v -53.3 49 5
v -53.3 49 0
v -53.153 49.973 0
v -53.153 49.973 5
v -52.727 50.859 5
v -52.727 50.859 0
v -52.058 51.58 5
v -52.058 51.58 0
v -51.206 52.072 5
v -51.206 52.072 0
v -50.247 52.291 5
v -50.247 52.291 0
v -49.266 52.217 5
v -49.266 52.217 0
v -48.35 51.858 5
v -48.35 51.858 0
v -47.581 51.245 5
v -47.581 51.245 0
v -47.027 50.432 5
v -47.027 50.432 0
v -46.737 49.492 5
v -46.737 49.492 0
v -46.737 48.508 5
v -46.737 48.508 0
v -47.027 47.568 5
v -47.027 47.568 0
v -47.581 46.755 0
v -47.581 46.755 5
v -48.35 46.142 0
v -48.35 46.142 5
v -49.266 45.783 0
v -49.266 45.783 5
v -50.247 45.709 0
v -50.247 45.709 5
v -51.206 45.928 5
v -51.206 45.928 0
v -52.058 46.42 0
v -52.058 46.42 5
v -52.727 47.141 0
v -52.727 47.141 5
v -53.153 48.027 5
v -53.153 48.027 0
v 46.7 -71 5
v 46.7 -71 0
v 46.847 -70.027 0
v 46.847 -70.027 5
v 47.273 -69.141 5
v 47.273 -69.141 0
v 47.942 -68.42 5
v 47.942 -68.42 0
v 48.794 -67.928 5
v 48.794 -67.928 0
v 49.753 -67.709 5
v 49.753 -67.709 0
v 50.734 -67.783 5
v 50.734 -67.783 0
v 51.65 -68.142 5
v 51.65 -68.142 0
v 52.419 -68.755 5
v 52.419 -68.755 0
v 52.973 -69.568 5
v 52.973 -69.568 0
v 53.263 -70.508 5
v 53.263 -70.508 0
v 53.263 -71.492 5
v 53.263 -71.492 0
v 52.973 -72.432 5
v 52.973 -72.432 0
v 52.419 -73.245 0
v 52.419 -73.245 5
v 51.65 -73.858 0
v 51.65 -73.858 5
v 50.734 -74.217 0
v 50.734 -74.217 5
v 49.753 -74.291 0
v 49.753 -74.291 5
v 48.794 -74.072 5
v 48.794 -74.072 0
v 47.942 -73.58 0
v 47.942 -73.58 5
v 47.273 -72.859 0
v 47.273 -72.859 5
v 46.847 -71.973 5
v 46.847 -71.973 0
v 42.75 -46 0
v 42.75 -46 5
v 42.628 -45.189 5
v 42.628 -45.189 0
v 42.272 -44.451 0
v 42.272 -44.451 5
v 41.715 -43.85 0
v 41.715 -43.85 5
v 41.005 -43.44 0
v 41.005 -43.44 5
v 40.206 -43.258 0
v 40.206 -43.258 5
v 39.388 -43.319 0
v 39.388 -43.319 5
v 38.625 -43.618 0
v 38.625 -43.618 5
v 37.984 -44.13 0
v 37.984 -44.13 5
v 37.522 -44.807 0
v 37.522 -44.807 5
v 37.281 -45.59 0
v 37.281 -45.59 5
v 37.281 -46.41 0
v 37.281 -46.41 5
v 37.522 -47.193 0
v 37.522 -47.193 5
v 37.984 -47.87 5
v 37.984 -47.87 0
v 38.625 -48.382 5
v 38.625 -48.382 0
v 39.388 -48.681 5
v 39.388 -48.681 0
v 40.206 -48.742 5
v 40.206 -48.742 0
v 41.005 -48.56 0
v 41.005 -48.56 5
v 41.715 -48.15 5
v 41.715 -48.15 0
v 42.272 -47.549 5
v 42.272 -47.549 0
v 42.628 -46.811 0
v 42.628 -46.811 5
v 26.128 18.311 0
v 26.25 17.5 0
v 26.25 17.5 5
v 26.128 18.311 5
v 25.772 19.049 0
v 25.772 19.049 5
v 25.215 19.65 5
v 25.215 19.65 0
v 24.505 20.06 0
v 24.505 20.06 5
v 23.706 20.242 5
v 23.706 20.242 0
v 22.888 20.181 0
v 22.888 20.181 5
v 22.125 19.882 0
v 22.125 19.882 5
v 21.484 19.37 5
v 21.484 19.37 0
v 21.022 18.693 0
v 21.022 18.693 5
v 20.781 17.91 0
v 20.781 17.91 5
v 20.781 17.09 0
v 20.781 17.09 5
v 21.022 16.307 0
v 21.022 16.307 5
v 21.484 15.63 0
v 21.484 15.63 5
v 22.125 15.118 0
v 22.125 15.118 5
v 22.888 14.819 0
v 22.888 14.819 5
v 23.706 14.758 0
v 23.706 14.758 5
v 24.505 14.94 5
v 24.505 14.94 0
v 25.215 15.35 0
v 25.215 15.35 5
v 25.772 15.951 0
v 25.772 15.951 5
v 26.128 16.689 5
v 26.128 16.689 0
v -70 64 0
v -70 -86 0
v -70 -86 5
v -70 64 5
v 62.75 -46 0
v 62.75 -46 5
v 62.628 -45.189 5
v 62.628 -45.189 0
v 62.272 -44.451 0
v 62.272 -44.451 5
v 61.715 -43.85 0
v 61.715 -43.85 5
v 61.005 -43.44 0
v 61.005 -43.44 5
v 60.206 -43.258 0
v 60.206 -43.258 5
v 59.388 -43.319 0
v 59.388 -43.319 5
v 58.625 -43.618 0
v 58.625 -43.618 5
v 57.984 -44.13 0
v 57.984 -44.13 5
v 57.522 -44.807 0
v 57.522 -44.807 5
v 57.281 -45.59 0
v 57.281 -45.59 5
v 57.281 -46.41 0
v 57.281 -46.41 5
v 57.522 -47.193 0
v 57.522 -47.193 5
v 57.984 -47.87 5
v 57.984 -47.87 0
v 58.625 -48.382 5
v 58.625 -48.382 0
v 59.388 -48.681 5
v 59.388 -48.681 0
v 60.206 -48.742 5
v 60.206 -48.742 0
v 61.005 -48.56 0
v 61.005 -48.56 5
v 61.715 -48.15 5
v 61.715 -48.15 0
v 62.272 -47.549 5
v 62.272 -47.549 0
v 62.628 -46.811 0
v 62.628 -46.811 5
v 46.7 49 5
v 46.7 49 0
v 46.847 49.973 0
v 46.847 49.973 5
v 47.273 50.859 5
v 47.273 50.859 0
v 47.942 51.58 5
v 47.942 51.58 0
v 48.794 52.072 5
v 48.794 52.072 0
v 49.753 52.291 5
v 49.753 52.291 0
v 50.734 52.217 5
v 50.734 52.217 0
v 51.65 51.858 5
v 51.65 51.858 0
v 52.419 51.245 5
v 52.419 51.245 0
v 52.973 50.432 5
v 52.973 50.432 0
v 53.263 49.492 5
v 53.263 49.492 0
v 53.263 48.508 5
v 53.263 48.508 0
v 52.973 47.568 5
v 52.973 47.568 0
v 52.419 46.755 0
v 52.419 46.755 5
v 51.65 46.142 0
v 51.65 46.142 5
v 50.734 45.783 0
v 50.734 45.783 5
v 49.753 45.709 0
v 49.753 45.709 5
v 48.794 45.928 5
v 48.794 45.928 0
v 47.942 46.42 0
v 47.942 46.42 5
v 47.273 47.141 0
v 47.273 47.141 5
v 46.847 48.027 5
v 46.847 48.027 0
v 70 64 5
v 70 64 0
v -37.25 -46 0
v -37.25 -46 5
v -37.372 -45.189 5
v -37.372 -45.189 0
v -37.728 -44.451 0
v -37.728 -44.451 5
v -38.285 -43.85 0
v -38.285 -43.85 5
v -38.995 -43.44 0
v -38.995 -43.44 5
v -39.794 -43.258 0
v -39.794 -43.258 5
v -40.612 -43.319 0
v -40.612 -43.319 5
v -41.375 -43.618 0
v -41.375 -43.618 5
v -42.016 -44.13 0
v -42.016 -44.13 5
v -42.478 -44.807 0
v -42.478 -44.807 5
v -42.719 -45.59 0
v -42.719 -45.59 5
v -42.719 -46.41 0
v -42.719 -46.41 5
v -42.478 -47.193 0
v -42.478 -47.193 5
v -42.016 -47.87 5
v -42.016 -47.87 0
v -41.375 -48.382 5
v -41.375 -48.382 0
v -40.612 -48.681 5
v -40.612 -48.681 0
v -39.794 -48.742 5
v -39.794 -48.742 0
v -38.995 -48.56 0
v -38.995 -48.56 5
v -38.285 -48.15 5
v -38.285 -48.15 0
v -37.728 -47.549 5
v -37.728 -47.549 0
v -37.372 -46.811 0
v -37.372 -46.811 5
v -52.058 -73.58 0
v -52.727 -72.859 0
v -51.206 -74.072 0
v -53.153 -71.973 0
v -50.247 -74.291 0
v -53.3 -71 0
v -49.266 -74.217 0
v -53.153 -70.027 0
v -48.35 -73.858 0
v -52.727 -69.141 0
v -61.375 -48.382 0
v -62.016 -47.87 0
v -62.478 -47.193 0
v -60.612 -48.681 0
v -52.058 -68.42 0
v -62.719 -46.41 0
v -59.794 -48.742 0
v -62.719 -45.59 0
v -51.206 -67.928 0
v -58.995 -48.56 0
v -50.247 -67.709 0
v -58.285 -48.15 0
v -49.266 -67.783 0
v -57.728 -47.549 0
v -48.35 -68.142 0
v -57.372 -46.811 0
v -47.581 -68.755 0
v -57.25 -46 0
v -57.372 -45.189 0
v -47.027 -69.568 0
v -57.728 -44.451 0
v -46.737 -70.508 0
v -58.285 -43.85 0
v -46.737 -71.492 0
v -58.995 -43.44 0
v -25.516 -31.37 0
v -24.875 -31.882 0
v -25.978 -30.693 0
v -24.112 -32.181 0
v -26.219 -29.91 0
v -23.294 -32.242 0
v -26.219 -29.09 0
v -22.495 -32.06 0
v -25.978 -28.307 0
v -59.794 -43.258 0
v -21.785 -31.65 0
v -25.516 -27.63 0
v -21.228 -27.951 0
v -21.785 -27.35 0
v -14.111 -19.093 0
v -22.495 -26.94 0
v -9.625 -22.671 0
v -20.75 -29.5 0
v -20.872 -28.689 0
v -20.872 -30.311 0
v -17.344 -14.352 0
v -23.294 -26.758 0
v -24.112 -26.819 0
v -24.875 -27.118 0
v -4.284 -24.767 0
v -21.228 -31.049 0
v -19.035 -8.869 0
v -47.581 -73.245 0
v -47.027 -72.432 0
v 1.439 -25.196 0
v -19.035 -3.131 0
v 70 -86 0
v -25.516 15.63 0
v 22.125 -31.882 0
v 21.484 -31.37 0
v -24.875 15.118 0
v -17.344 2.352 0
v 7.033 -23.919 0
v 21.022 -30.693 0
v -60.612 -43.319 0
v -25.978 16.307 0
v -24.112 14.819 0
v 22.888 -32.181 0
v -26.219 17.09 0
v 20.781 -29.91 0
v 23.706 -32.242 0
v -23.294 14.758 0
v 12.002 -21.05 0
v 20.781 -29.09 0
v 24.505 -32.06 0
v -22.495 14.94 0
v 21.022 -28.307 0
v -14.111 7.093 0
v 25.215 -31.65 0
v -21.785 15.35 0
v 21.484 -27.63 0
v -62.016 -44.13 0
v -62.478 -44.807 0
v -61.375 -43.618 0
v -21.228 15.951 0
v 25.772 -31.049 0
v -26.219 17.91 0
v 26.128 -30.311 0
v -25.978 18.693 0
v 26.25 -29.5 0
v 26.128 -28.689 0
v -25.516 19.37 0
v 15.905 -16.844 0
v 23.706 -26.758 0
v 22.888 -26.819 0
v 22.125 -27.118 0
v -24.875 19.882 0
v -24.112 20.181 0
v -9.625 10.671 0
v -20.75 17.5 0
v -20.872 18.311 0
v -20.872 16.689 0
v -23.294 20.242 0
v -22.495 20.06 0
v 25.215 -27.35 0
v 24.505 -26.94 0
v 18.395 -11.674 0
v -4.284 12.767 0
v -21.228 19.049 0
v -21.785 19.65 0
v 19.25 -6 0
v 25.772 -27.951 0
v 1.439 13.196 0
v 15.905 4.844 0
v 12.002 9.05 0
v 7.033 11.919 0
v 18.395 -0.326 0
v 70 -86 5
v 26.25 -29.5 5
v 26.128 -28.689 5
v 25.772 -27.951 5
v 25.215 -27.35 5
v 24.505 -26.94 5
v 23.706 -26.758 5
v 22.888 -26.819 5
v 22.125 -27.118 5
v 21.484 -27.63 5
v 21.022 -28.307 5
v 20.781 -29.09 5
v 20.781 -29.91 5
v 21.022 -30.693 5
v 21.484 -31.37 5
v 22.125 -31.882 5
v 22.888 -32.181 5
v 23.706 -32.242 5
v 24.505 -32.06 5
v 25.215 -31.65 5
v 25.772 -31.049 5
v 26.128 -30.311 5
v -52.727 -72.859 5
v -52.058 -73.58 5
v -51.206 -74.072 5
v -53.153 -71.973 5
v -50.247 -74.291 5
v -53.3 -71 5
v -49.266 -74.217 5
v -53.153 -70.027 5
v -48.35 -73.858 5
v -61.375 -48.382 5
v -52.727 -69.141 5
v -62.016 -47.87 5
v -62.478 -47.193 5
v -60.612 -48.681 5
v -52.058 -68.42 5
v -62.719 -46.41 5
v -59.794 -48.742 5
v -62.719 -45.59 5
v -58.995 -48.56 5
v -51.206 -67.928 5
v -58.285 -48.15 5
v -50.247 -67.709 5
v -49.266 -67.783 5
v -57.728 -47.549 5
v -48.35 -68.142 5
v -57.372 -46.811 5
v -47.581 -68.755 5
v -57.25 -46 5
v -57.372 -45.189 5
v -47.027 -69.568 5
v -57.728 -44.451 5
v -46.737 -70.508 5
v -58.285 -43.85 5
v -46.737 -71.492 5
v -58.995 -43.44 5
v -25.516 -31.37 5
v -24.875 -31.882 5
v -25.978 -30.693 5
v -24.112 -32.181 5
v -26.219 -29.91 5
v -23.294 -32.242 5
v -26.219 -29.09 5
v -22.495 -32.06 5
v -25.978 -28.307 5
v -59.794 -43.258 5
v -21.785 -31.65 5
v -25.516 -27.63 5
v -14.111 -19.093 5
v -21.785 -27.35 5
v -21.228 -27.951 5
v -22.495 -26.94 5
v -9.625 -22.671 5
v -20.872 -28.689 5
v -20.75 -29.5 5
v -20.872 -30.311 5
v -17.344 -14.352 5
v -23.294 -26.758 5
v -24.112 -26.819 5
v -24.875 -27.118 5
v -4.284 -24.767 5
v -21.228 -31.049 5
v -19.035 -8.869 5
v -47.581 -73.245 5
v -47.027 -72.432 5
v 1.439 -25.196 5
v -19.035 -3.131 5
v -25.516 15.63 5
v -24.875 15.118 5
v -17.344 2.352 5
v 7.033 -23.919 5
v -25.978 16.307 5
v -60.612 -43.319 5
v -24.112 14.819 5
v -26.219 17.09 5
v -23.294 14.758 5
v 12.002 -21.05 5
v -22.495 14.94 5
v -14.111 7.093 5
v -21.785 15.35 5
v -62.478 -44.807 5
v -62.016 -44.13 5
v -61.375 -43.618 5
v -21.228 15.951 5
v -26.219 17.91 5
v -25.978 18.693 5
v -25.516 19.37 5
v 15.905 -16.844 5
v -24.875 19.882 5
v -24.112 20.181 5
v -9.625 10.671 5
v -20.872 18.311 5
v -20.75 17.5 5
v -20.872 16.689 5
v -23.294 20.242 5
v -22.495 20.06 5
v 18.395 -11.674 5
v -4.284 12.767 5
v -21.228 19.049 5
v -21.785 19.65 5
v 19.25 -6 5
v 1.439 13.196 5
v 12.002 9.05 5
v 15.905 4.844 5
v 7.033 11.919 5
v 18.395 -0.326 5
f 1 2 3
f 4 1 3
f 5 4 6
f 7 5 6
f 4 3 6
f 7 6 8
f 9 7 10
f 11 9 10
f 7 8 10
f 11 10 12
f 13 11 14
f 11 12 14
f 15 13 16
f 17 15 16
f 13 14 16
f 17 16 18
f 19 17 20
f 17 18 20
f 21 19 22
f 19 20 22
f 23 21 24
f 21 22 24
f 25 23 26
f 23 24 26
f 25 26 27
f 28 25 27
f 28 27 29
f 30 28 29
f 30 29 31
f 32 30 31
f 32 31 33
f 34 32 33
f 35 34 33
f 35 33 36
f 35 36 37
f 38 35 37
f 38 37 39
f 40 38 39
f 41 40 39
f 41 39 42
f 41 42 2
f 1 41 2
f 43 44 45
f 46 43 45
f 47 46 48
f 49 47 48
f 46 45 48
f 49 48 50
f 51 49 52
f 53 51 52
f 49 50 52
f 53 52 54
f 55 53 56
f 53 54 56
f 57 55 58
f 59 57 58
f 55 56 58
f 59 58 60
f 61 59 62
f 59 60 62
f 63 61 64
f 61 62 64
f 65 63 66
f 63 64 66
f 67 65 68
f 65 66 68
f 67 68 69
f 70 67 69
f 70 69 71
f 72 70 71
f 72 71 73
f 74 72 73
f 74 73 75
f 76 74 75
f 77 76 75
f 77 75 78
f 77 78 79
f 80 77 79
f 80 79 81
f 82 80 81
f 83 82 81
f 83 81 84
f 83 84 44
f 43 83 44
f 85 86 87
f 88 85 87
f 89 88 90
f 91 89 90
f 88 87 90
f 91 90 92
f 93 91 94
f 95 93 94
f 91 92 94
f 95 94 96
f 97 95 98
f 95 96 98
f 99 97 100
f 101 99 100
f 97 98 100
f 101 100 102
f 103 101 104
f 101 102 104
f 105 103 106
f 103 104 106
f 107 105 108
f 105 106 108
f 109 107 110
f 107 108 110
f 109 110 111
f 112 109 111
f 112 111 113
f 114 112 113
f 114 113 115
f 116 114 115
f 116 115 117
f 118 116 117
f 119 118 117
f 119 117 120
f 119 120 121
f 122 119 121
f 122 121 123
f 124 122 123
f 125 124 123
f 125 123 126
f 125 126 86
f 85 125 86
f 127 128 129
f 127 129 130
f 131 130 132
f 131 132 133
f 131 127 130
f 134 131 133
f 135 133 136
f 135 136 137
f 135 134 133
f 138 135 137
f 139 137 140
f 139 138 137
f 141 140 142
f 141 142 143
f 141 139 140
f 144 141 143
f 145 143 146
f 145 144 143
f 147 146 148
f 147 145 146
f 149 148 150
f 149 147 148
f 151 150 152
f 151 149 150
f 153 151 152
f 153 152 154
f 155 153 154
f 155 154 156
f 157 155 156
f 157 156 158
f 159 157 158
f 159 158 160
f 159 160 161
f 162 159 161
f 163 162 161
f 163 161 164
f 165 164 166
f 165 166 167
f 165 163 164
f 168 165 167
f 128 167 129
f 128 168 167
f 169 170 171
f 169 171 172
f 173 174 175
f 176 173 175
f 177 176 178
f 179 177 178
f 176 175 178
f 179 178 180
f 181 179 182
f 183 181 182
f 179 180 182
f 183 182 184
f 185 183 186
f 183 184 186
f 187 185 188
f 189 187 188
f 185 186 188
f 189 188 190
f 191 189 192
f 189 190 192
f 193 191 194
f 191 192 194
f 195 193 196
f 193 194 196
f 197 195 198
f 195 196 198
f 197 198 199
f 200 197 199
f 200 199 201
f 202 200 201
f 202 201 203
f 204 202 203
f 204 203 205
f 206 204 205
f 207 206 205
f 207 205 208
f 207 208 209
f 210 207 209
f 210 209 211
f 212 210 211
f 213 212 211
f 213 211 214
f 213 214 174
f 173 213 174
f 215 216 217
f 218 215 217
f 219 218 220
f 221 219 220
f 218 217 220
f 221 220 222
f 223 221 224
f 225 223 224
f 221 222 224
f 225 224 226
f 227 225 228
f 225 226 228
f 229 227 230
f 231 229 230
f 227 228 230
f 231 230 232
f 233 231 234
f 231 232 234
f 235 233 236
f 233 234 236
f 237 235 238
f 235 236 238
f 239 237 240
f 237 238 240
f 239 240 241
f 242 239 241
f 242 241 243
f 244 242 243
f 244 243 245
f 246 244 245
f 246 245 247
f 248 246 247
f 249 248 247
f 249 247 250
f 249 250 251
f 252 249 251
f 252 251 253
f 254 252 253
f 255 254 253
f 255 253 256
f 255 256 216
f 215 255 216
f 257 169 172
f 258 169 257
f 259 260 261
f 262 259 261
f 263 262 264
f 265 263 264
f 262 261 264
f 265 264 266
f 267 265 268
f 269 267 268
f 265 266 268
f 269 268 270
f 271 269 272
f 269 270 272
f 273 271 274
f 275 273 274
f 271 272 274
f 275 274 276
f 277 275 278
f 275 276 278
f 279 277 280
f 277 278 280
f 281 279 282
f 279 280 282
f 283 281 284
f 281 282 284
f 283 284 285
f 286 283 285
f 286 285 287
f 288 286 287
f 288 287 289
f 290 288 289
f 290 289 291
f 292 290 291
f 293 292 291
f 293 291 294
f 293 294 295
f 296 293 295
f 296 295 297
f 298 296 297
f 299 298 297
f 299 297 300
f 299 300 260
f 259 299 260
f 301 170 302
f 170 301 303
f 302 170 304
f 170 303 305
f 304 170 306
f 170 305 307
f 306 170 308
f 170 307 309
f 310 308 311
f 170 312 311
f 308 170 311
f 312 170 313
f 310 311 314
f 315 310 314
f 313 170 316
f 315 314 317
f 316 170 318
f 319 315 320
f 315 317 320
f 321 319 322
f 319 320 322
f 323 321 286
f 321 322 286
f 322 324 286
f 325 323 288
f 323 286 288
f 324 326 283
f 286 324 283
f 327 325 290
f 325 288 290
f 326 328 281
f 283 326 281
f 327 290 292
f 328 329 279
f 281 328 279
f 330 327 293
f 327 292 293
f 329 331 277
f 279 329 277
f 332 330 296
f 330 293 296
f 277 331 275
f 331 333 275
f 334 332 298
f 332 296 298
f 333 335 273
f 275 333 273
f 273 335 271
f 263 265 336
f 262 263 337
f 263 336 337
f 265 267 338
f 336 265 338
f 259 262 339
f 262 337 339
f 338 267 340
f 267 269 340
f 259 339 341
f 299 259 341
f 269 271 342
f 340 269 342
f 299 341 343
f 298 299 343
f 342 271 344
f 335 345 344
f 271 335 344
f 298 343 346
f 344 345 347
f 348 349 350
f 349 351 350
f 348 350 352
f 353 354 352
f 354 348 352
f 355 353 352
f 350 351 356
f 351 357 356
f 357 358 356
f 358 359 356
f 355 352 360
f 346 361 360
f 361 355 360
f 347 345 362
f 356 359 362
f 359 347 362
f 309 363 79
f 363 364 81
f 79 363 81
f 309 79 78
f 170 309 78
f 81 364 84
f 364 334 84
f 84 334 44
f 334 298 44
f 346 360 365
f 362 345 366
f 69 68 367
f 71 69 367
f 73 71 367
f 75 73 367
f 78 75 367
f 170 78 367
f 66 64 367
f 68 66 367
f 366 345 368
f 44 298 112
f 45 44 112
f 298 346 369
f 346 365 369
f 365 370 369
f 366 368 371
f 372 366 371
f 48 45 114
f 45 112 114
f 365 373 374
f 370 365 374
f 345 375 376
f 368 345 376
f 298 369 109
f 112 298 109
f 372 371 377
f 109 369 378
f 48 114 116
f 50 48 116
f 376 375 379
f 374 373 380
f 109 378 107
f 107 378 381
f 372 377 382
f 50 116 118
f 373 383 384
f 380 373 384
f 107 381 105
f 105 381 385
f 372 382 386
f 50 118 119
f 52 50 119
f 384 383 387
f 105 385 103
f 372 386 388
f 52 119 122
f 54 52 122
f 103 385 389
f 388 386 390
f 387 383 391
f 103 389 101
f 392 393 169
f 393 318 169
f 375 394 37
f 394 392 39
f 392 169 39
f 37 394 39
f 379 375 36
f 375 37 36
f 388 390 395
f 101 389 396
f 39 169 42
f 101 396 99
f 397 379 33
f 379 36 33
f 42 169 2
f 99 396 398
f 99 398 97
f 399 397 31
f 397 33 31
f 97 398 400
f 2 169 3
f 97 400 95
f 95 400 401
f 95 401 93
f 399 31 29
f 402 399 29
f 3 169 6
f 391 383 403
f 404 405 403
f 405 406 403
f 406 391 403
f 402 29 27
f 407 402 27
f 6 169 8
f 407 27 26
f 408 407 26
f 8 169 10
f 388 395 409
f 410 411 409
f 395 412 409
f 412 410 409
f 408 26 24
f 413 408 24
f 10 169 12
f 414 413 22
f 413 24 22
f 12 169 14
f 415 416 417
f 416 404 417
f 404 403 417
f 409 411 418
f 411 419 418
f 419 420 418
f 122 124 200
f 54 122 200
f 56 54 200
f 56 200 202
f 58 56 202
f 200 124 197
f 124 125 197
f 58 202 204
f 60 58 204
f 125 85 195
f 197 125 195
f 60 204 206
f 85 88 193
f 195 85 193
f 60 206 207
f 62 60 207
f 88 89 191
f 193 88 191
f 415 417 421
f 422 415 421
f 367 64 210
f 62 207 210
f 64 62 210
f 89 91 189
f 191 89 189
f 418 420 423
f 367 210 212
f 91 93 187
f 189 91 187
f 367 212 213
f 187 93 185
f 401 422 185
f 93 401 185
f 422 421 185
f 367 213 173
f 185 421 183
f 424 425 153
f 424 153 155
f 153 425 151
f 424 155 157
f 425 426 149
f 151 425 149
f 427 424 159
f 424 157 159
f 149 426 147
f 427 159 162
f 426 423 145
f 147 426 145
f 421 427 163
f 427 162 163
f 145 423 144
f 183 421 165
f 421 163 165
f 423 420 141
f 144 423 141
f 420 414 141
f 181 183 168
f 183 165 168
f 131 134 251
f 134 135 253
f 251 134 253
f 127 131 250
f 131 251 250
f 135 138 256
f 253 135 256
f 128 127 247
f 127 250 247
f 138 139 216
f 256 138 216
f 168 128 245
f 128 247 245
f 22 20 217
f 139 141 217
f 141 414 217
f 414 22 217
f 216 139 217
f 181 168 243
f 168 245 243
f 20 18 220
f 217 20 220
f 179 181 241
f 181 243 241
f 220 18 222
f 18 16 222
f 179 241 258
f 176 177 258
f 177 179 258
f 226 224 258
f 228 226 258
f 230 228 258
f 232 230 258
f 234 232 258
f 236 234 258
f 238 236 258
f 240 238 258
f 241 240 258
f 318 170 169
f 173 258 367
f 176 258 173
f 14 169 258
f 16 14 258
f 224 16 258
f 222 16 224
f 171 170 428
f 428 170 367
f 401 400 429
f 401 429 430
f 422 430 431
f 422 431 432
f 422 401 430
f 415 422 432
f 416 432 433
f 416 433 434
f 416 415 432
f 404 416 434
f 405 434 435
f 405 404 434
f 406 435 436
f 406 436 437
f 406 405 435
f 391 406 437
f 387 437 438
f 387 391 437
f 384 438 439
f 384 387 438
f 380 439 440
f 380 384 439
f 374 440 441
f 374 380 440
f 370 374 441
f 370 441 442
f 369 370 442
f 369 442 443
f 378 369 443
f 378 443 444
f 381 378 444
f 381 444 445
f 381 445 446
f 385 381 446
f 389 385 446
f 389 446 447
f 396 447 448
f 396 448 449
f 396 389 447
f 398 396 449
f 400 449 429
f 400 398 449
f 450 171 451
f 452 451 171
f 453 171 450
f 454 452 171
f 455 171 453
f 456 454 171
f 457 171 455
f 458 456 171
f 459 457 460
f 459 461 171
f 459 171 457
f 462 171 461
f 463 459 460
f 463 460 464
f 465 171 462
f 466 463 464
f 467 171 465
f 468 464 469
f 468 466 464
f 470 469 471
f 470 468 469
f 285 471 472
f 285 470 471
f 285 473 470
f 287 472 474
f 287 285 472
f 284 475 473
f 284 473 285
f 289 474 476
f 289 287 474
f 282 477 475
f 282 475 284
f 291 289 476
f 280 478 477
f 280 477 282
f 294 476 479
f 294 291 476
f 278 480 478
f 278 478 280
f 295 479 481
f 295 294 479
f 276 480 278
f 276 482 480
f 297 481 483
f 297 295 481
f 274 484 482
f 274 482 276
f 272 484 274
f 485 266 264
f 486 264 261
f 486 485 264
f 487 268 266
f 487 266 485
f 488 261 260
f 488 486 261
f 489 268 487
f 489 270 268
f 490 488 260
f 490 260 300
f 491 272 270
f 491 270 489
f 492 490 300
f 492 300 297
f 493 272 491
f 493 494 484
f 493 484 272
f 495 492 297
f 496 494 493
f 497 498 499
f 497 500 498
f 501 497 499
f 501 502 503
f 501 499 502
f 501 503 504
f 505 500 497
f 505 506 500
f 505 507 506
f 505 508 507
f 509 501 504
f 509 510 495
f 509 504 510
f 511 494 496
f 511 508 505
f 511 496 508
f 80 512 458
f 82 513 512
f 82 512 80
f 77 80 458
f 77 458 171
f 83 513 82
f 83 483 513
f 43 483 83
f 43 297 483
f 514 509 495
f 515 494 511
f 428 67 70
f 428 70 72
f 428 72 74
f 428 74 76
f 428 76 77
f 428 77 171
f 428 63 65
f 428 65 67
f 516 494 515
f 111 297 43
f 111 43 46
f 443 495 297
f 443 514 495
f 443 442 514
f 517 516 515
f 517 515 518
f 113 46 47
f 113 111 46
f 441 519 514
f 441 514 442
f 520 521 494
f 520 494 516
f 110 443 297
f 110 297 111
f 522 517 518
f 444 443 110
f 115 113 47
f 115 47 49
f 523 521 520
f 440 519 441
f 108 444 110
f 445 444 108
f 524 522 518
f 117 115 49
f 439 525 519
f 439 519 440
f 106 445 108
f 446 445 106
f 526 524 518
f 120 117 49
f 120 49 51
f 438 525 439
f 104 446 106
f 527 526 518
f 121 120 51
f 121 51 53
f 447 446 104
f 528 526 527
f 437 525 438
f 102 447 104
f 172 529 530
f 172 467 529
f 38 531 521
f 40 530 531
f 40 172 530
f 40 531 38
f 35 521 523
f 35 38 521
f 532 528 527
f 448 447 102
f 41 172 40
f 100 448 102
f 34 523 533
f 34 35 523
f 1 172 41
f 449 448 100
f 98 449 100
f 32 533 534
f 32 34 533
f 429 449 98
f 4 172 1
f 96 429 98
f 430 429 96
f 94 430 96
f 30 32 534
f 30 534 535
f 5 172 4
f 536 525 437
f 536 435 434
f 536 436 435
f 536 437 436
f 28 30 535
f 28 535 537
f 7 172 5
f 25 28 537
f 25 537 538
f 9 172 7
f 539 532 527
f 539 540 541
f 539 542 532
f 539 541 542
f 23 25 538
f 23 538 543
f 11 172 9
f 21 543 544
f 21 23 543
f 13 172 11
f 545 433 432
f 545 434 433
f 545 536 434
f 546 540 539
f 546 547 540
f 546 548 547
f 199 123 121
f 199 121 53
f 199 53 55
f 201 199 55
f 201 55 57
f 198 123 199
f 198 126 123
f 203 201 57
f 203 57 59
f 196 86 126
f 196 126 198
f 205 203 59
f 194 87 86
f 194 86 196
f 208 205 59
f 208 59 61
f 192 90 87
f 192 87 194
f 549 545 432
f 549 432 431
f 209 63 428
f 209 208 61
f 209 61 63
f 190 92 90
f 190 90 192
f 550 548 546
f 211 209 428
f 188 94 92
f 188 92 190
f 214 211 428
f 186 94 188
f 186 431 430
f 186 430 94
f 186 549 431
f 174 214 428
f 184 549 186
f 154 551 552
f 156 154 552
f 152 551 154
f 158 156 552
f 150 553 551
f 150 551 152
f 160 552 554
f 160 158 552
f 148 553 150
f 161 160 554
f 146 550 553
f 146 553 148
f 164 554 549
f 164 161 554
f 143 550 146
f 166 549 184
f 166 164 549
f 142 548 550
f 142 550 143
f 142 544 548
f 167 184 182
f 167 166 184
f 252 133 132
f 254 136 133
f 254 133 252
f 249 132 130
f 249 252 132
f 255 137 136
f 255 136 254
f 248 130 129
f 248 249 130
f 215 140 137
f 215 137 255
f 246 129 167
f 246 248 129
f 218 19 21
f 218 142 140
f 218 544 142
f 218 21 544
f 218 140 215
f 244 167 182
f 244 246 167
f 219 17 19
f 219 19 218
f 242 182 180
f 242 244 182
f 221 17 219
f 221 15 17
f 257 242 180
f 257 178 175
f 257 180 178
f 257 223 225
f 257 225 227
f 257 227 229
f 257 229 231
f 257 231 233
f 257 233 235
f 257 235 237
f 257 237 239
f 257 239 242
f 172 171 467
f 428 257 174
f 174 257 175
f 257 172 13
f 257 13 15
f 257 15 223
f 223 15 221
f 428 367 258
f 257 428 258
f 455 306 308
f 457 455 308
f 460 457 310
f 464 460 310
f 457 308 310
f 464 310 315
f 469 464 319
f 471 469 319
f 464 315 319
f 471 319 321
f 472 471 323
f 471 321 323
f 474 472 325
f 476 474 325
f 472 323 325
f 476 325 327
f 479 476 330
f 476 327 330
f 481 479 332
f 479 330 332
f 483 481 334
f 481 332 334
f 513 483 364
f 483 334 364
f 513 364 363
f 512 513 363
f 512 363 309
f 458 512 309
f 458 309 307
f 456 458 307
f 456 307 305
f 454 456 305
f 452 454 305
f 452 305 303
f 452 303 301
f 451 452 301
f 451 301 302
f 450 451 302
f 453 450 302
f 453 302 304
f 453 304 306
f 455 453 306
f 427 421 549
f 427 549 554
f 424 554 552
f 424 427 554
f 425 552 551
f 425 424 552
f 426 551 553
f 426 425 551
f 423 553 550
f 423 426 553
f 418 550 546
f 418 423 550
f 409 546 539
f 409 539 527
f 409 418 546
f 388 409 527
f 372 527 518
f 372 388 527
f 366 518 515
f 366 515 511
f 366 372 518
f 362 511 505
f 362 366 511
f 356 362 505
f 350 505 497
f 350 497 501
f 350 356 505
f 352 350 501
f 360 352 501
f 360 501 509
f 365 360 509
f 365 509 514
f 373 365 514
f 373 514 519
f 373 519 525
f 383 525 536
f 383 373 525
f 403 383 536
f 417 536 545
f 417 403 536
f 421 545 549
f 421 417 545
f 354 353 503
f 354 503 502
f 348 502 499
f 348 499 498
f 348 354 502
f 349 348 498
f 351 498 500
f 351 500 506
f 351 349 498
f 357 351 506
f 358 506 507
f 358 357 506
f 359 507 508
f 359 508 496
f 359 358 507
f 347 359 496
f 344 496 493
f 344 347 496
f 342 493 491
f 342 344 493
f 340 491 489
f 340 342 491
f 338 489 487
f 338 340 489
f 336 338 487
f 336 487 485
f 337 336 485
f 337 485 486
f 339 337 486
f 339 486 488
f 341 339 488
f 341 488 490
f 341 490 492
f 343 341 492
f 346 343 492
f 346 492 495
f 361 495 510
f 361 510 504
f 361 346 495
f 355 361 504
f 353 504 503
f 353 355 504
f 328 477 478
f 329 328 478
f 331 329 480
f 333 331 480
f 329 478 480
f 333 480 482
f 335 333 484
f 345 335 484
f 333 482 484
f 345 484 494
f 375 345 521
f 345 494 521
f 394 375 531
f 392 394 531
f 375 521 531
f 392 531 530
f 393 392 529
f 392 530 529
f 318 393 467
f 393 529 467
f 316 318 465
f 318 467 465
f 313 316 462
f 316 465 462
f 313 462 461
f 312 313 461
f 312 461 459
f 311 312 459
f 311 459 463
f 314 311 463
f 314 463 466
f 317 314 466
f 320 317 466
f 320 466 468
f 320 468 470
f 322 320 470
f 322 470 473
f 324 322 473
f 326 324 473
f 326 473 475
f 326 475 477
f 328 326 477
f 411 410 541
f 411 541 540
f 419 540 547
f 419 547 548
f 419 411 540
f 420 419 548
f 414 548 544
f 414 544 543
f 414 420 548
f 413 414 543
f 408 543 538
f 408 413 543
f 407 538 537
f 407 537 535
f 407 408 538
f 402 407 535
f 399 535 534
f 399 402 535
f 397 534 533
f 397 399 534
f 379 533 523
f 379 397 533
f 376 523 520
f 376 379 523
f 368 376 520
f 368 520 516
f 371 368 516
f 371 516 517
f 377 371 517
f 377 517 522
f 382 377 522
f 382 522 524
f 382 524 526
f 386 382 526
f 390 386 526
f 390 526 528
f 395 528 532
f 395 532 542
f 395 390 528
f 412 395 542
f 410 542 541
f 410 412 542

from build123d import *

# Parameters (mm, degrees)
SKETCH1_W             = 140
SKETCH1_H             = 150
SKETCH1_R             = 2.75
SKETCH1_R_2           = 19.25
BOSS_EXTRUDE1_DEPTH   = 5
F_5_0MM_DOWEL_HOLE1_D = 5.5
F_6_0MM_DOWEL_HOLE2_D = 6.6


with BuildPart() as part:
    # Sketch1 → Boss-Extrude1 (new body)
    with BuildSketch(Plane.XY):
        with Locations((0, -11)):
            Rectangle(SKETCH1_W, SKETCH1_H)
        with Locations((23.5, 17.5)):
            Circle(SKETCH1_R, mode=Mode.SUBTRACT)
        with Locations((-23.5, 17.5)):
            Circle(SKETCH1_R, mode=Mode.SUBTRACT)
        with Locations((-23.5, -29.5)):
            Circle(SKETCH1_R, mode=Mode.SUBTRACT)
        with Locations((23.5, -29.5)):
            Circle(SKETCH1_R, mode=Mode.SUBTRACT)
        with Locations((0, -6)):
            Circle(SKETCH1_R_2, mode=Mode.SUBTRACT)
    extrude(amount=BOSS_EXTRUDE1_DEPTH)

    # Ø5.0mm Dowel Hole1 (through all)
    with Locations(Plane(origin=(60, -46, 0), x_dir=(-1, 0, 0), z_dir=(0, 0, -1))):
        with Locations((0, 0), (120, 0), (100, 0), (20, 0)):
            Hole(F_5_0MM_DOWEL_HOLE1_D / 2)

    # Ø6.0mm Dowel Hole2 (through all)
    with Locations(Plane(origin=(-50, 49, 5), x_dir=(1, 0, 0), z_dir=(0, 0, 1))):
        with Locations((0, 0), (100, 0), (100, -120), (0, -120)):
            Hole(F_6_0MM_DOWEL_HOLE2_D / 2)


solid = part.part
